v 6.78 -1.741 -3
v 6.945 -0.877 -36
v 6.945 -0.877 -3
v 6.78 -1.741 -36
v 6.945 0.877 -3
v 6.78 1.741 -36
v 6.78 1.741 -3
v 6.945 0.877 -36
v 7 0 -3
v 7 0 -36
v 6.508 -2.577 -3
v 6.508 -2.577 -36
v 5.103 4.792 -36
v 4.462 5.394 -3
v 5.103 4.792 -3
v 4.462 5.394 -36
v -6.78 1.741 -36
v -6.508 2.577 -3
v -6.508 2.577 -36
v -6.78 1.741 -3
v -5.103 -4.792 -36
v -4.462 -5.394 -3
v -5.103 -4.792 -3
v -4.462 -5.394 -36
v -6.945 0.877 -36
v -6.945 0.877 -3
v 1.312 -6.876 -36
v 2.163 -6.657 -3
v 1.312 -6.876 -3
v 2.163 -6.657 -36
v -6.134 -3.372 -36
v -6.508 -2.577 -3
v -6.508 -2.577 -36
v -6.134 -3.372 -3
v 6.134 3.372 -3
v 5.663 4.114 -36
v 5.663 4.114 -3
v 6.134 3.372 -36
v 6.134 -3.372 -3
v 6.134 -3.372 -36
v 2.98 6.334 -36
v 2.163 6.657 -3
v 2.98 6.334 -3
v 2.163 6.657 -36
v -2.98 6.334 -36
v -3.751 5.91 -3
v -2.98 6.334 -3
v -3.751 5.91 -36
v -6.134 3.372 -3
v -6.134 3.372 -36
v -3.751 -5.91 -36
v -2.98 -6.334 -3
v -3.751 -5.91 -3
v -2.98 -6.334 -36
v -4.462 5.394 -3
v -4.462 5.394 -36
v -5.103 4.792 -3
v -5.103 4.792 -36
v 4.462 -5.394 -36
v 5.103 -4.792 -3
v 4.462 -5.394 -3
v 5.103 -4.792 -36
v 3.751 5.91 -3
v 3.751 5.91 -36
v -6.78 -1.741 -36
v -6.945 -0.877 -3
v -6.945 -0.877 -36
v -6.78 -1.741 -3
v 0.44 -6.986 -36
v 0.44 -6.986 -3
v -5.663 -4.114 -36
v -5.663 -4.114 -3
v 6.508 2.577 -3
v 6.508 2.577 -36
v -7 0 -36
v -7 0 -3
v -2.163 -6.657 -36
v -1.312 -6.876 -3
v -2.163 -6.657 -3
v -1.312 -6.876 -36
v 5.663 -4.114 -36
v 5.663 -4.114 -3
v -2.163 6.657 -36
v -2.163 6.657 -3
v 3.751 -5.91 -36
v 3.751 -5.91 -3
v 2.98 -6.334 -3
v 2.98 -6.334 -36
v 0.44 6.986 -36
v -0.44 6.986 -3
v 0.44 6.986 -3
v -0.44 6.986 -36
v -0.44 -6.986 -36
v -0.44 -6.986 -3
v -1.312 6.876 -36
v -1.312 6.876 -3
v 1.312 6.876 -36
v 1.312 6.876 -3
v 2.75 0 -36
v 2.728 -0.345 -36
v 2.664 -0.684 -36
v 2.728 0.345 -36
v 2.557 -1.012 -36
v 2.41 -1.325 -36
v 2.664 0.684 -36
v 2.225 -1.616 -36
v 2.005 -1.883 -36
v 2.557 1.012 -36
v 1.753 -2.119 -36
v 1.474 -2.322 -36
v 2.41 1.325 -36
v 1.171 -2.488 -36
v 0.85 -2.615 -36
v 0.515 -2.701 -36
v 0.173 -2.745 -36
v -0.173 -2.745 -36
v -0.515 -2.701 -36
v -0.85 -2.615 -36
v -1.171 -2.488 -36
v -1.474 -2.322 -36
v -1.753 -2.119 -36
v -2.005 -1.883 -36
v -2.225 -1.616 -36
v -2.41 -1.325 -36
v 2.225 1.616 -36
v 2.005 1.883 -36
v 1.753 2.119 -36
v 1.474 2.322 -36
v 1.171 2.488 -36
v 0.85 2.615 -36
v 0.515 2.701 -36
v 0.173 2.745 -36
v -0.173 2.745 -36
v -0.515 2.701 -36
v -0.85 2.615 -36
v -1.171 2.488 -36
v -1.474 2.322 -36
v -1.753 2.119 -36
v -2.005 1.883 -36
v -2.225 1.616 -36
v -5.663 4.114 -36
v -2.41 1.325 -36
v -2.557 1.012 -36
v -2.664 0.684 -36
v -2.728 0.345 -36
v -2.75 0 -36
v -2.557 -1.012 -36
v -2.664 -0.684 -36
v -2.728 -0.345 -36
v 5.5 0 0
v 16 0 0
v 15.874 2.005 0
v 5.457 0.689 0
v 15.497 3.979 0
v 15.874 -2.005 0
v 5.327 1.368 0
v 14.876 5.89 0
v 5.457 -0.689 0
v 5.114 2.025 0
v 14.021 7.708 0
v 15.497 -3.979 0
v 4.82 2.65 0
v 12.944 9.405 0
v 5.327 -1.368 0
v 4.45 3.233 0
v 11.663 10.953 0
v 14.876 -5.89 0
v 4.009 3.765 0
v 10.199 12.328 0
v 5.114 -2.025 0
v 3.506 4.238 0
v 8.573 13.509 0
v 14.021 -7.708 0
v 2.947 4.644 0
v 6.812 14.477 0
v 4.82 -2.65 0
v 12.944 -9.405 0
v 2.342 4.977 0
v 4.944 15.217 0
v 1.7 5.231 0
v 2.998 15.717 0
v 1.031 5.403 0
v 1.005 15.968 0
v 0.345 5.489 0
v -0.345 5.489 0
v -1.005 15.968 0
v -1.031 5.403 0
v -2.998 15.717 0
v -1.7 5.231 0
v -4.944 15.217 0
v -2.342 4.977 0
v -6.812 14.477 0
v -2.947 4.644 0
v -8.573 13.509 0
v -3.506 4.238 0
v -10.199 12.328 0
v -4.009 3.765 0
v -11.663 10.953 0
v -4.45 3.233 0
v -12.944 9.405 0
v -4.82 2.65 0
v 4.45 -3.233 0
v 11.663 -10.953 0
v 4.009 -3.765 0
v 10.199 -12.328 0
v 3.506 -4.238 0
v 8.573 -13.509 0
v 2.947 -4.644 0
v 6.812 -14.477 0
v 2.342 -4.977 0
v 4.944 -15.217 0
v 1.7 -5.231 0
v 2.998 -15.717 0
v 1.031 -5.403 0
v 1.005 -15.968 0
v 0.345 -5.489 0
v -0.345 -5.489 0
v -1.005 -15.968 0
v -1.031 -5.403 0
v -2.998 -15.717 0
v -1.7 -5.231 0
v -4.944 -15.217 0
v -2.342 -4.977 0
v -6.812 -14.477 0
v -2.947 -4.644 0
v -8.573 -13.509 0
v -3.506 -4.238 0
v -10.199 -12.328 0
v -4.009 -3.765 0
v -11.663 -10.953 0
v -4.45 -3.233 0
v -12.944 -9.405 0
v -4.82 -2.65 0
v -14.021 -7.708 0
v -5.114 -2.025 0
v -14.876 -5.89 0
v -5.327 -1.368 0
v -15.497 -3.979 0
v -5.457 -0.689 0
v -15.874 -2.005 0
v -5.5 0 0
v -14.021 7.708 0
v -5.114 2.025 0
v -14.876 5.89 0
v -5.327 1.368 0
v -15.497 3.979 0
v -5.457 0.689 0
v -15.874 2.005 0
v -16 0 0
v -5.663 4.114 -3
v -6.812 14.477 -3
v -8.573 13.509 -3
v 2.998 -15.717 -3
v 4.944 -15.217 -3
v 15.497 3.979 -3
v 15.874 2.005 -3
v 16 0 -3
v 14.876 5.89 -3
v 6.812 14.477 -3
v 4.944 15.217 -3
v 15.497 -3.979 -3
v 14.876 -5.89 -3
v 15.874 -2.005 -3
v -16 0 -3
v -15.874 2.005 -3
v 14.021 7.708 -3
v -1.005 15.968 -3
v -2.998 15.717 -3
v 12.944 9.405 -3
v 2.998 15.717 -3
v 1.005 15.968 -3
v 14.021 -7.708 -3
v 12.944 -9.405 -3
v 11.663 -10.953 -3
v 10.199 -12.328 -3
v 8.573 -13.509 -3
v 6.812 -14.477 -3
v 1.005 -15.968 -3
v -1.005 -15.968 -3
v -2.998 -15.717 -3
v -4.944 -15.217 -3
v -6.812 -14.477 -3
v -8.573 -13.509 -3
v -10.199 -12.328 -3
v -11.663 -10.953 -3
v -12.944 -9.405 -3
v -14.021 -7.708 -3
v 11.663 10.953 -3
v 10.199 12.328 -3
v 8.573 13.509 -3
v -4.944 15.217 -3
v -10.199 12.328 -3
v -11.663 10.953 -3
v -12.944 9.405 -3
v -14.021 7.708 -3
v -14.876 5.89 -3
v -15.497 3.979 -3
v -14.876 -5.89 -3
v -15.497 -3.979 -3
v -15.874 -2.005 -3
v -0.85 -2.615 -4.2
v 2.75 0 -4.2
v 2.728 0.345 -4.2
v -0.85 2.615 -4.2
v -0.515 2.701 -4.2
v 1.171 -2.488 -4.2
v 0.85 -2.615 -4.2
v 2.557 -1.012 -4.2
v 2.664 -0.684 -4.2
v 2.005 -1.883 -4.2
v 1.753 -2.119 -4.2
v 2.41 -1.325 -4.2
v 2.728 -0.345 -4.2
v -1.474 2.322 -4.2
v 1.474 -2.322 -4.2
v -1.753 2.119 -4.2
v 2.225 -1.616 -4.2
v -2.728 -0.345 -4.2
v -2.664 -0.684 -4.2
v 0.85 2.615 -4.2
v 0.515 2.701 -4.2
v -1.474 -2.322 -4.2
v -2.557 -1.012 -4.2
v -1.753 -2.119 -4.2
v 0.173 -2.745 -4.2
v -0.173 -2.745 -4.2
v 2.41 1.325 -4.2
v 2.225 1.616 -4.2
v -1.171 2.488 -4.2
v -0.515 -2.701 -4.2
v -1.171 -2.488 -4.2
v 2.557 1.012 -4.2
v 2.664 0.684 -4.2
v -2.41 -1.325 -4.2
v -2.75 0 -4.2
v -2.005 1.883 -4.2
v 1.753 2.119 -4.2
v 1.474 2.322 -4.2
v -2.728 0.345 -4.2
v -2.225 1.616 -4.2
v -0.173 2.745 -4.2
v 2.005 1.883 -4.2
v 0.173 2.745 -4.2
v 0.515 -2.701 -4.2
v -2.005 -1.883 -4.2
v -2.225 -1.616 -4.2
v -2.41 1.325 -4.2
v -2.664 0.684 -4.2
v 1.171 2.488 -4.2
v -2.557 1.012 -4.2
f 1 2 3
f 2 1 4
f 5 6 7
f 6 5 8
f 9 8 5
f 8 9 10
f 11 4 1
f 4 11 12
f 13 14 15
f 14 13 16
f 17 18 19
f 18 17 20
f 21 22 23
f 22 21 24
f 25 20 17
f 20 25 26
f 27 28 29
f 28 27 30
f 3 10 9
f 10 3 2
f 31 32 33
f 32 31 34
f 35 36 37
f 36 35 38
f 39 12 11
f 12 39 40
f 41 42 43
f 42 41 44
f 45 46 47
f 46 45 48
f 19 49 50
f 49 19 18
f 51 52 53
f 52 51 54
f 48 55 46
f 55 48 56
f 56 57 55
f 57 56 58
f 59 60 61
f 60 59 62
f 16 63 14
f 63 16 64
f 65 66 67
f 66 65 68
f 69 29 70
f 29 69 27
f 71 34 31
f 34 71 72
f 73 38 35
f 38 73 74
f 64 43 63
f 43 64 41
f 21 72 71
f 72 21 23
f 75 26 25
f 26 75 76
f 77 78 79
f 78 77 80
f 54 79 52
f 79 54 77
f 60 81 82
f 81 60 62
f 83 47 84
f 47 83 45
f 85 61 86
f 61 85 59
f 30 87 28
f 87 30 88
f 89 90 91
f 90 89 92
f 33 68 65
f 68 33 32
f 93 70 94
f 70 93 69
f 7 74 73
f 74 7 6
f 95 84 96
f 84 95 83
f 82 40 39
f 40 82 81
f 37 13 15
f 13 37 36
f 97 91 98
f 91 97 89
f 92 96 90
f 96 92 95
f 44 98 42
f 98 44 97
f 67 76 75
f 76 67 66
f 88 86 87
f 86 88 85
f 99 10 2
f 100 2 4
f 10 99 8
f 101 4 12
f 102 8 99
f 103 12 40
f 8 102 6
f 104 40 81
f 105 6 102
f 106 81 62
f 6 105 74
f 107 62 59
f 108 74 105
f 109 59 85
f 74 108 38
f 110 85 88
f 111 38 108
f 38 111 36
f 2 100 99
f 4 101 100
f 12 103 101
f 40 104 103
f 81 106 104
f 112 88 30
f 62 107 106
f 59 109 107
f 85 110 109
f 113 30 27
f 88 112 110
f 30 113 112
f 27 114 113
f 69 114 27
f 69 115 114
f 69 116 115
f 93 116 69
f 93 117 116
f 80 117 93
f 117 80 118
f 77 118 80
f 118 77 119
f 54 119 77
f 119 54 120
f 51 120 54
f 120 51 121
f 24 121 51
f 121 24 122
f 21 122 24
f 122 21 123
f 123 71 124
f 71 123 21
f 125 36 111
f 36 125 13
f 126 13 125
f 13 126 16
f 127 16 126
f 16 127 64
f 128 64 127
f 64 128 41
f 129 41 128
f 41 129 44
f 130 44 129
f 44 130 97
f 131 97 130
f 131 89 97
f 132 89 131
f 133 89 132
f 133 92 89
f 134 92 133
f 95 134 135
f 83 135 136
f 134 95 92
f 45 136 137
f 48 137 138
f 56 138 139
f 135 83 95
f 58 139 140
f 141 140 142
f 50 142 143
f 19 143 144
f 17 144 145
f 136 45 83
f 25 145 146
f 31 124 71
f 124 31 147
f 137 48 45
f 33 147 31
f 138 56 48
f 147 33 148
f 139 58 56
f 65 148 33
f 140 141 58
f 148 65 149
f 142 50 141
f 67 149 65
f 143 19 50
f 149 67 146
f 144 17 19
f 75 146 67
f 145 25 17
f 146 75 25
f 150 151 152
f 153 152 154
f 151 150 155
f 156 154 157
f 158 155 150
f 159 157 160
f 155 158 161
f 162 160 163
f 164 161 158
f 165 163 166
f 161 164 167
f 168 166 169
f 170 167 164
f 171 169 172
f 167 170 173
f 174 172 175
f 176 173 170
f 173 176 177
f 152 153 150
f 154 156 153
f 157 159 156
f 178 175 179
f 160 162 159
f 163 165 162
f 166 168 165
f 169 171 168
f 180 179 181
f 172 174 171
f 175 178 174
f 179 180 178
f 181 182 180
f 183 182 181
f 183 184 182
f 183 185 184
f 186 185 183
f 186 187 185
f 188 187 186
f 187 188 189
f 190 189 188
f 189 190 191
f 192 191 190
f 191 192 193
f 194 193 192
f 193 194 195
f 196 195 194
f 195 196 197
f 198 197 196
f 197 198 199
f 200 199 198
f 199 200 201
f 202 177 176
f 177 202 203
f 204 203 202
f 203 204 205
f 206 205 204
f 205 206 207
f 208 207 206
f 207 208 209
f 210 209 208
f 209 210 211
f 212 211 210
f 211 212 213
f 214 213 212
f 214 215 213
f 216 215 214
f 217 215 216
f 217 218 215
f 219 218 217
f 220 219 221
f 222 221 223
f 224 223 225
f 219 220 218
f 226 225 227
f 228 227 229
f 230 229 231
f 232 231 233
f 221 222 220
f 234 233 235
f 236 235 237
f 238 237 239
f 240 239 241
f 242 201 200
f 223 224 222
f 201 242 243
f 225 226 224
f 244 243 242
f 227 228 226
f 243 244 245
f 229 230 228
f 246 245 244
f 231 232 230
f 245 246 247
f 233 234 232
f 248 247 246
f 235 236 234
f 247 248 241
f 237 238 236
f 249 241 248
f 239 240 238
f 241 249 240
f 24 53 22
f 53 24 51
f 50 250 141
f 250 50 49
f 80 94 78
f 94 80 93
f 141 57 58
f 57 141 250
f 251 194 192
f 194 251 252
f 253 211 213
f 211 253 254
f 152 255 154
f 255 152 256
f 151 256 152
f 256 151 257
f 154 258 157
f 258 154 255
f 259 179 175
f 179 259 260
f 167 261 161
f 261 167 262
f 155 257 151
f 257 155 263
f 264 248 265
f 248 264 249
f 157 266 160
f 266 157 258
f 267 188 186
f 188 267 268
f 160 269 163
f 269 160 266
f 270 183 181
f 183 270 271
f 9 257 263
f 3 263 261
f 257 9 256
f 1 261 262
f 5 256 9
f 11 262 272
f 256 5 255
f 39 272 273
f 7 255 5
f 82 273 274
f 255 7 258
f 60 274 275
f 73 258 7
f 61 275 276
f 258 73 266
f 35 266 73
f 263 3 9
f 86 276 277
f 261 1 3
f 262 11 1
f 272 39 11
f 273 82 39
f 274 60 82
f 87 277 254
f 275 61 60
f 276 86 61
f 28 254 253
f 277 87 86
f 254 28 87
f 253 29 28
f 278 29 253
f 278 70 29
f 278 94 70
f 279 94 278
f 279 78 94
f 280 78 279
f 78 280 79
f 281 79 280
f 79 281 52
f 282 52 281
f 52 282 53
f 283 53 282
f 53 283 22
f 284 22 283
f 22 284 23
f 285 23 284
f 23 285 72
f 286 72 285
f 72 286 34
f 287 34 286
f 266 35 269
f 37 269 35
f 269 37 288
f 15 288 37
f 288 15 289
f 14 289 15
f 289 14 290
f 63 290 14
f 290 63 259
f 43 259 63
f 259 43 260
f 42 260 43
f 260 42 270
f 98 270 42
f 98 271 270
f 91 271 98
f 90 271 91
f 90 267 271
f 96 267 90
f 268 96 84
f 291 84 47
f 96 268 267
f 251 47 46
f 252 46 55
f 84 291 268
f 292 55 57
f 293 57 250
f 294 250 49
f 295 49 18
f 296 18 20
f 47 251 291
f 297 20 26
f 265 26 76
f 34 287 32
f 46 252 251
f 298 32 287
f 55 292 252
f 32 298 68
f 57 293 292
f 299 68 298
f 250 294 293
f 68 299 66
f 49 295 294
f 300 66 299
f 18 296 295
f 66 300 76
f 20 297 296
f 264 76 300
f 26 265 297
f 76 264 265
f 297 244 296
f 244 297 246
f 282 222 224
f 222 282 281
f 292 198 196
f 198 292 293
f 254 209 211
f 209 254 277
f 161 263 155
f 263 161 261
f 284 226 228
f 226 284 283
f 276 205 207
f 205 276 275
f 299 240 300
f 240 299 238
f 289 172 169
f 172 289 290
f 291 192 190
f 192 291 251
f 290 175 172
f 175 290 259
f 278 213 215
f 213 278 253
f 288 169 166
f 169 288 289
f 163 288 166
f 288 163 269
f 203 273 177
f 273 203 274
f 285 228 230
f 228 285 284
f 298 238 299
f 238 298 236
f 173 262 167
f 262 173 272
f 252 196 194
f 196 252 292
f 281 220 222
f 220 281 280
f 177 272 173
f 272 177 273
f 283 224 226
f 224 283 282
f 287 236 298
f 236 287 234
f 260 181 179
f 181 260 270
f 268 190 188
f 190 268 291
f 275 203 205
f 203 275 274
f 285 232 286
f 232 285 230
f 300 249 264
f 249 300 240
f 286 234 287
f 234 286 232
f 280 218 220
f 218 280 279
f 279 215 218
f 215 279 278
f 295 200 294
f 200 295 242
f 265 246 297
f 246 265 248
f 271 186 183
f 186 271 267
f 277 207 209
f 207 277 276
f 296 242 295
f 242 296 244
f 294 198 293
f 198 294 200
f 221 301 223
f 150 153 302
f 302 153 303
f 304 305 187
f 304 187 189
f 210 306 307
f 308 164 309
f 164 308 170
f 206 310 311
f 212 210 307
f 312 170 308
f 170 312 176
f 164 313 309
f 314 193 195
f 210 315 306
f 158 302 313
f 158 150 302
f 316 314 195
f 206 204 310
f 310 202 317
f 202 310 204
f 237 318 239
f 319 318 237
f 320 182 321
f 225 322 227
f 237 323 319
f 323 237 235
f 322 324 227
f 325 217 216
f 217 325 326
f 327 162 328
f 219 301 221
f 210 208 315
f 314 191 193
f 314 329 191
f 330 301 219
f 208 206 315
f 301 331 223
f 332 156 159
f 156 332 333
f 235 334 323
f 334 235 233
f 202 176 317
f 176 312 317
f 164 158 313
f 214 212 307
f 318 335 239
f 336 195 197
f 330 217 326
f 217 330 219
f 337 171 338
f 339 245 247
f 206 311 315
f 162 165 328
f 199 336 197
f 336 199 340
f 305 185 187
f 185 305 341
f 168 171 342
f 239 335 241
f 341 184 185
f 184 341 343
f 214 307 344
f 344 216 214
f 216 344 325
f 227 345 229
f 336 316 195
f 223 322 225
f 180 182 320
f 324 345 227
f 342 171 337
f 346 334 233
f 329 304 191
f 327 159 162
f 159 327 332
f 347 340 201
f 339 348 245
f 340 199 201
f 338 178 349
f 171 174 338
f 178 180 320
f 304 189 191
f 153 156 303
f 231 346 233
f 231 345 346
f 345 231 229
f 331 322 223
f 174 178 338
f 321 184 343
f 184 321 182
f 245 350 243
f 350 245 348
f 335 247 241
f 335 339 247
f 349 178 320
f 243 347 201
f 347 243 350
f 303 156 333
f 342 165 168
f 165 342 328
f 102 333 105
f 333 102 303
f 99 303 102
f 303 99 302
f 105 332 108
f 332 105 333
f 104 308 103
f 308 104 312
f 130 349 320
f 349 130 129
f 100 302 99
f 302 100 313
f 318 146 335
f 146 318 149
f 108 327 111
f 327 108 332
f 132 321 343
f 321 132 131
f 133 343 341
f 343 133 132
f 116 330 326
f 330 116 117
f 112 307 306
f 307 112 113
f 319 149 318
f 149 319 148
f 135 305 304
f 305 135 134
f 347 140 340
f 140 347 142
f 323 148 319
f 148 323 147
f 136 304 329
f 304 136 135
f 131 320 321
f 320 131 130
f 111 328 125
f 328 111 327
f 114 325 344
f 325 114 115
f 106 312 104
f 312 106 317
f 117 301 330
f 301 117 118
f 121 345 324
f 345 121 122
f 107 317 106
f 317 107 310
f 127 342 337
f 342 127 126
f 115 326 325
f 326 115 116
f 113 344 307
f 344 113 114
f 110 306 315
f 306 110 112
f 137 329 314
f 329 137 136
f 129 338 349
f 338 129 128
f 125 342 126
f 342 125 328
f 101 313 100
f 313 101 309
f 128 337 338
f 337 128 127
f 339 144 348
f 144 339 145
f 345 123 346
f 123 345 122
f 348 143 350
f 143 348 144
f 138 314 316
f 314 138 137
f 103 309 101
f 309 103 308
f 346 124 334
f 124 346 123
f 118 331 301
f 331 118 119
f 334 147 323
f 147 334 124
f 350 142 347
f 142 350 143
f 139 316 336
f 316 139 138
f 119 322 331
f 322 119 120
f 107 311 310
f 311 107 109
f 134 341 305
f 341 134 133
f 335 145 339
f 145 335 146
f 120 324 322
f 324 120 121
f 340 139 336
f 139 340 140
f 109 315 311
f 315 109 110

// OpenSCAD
$fn = 50;


difference() {
	union() {
		translate(v = [0, 0, -36.0000000000]) {
			cylinder(h = 36, r = 7.0000000000);
		}
		translate(v = [0, 0, -3.0000000000]) {
			cylinder(h = 3, r = 16.0000000000);
		}
	}
	union() {
		translate(v = [0, 0, 0]) {
			rotate(a = [0, 0, 0]) {
				difference() {
					union() {
						#translate(v = [0, 0, -36.0000000000]) {
							cylinder(h = 36, r = 2.2500000000);
						}
						#translate(v = [0, 0, -4.2000000000]) {
							cylinder(h = 4.2000000000, r1 = 2.7500000000, r2 = 5.5000000000);
						}
						#translate(v = [0, 0, -36.0000000000]) {
							cylinder(h = 36, r = 2.7500000000);
						}
						#translate(v = [0, 0, -36.0000000000]) {
							cylinder(h = 36, r = 2.2500000000);
						}
					}
					union();
				}
			}
		}
	}
}
